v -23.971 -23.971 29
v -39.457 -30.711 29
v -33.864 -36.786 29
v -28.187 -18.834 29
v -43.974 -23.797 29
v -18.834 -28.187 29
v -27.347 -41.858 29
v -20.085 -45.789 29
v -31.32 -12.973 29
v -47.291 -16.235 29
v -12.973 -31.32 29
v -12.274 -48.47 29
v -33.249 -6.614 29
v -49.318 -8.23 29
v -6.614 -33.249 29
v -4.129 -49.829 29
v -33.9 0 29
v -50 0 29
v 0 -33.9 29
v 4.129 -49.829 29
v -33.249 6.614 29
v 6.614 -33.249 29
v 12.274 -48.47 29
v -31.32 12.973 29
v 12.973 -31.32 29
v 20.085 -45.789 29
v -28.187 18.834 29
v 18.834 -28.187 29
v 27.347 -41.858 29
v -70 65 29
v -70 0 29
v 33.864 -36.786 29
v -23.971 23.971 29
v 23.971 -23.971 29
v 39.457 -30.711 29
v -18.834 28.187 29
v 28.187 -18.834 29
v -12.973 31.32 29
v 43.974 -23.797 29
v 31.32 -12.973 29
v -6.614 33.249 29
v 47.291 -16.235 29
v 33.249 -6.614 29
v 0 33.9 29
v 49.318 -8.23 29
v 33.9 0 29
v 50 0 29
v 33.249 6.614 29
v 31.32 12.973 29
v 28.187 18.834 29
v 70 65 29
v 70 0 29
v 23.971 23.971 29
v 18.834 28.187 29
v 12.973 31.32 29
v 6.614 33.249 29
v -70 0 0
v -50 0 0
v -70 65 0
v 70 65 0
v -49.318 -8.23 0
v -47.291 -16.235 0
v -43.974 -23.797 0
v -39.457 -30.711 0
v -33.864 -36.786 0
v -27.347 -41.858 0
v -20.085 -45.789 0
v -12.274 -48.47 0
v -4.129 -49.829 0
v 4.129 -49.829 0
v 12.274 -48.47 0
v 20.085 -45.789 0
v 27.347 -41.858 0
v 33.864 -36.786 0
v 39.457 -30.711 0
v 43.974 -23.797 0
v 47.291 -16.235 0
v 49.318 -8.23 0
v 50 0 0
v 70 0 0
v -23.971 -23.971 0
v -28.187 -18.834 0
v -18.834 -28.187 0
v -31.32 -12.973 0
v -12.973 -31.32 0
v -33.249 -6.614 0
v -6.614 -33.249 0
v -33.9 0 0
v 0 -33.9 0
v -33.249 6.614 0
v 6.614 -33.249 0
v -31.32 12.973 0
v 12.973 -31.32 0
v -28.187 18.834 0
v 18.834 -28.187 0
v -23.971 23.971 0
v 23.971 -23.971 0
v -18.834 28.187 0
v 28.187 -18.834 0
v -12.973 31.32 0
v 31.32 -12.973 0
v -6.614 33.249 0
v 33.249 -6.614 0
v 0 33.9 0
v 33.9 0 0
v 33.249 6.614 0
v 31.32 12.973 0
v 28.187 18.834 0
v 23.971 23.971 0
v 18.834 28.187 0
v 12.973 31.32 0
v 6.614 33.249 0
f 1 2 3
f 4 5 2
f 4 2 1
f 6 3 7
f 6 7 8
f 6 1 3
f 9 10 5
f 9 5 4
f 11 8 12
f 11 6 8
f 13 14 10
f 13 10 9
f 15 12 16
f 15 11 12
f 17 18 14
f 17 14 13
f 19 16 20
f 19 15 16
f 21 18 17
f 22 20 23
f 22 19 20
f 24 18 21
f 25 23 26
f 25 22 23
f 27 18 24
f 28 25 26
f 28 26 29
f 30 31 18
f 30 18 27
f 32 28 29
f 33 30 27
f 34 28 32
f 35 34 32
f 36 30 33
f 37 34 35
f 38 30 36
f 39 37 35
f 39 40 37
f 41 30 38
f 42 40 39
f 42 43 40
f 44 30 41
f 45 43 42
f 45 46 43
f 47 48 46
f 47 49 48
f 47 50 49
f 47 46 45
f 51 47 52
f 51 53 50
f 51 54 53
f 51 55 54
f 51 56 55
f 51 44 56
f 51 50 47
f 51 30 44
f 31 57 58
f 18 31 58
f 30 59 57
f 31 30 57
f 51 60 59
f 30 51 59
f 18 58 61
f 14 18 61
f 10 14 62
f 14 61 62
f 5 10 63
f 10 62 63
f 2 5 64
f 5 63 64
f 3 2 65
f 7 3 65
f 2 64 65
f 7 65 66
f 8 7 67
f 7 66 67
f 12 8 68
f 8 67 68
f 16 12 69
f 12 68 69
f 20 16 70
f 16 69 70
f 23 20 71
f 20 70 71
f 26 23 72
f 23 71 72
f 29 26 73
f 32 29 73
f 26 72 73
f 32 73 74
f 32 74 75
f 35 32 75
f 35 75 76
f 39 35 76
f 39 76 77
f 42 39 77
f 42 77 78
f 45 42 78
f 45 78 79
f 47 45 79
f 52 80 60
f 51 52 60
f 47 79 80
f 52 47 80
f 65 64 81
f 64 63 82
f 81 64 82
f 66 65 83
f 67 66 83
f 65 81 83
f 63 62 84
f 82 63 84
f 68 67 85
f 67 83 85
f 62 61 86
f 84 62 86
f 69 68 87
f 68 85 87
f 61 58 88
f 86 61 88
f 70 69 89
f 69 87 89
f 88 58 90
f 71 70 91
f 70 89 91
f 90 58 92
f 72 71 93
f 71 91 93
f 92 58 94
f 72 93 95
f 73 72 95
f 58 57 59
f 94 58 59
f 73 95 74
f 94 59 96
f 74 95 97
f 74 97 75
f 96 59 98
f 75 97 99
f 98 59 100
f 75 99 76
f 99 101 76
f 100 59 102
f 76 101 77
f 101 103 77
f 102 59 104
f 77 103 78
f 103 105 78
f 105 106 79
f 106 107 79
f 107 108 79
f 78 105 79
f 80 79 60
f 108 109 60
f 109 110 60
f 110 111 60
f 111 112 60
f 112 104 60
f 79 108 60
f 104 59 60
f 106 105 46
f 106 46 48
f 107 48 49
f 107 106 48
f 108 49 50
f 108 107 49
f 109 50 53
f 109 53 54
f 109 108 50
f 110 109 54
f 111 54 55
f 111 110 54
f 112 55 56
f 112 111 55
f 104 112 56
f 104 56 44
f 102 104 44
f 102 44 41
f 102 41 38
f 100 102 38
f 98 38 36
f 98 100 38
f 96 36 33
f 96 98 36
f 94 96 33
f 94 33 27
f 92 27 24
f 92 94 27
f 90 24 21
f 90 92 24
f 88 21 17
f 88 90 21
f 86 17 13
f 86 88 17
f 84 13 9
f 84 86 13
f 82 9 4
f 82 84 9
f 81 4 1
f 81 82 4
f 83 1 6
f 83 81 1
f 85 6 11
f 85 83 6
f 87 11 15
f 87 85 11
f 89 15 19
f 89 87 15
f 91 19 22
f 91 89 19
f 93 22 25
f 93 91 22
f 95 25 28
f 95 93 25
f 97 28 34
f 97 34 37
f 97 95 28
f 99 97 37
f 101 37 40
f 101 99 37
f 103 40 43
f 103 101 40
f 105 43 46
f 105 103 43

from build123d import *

# Parameters (mm, degrees)
SKETCH_1_R      = 50
SKETCH_1_R_2    = 33.9
EXTRUDE_1_DEPTH = 29


with BuildPart() as part:
    # Эскиз1 → Бобышка-Вытянуть1 (new body)
    with BuildSketch(Plane.XY):
        Circle(SKETCH_1_R)
        Circle(SKETCH_1_R_2, mode=Mode.SUBTRACT)
        with BuildLine():
            Line((70, 65), (-70, 65))
            Line((-70, 65), (-70, 0))
            Line((-70, 0), (-50, 0))
            ThreePointArc((-50, 0), (0, 50), (50, 0))
            Line((50, 0), (70, 0))
            Line((70, 0), (70, 65))
        make_face()
    extrude(amount=EXTRUDE_1_DEPTH)


solid = part.part
